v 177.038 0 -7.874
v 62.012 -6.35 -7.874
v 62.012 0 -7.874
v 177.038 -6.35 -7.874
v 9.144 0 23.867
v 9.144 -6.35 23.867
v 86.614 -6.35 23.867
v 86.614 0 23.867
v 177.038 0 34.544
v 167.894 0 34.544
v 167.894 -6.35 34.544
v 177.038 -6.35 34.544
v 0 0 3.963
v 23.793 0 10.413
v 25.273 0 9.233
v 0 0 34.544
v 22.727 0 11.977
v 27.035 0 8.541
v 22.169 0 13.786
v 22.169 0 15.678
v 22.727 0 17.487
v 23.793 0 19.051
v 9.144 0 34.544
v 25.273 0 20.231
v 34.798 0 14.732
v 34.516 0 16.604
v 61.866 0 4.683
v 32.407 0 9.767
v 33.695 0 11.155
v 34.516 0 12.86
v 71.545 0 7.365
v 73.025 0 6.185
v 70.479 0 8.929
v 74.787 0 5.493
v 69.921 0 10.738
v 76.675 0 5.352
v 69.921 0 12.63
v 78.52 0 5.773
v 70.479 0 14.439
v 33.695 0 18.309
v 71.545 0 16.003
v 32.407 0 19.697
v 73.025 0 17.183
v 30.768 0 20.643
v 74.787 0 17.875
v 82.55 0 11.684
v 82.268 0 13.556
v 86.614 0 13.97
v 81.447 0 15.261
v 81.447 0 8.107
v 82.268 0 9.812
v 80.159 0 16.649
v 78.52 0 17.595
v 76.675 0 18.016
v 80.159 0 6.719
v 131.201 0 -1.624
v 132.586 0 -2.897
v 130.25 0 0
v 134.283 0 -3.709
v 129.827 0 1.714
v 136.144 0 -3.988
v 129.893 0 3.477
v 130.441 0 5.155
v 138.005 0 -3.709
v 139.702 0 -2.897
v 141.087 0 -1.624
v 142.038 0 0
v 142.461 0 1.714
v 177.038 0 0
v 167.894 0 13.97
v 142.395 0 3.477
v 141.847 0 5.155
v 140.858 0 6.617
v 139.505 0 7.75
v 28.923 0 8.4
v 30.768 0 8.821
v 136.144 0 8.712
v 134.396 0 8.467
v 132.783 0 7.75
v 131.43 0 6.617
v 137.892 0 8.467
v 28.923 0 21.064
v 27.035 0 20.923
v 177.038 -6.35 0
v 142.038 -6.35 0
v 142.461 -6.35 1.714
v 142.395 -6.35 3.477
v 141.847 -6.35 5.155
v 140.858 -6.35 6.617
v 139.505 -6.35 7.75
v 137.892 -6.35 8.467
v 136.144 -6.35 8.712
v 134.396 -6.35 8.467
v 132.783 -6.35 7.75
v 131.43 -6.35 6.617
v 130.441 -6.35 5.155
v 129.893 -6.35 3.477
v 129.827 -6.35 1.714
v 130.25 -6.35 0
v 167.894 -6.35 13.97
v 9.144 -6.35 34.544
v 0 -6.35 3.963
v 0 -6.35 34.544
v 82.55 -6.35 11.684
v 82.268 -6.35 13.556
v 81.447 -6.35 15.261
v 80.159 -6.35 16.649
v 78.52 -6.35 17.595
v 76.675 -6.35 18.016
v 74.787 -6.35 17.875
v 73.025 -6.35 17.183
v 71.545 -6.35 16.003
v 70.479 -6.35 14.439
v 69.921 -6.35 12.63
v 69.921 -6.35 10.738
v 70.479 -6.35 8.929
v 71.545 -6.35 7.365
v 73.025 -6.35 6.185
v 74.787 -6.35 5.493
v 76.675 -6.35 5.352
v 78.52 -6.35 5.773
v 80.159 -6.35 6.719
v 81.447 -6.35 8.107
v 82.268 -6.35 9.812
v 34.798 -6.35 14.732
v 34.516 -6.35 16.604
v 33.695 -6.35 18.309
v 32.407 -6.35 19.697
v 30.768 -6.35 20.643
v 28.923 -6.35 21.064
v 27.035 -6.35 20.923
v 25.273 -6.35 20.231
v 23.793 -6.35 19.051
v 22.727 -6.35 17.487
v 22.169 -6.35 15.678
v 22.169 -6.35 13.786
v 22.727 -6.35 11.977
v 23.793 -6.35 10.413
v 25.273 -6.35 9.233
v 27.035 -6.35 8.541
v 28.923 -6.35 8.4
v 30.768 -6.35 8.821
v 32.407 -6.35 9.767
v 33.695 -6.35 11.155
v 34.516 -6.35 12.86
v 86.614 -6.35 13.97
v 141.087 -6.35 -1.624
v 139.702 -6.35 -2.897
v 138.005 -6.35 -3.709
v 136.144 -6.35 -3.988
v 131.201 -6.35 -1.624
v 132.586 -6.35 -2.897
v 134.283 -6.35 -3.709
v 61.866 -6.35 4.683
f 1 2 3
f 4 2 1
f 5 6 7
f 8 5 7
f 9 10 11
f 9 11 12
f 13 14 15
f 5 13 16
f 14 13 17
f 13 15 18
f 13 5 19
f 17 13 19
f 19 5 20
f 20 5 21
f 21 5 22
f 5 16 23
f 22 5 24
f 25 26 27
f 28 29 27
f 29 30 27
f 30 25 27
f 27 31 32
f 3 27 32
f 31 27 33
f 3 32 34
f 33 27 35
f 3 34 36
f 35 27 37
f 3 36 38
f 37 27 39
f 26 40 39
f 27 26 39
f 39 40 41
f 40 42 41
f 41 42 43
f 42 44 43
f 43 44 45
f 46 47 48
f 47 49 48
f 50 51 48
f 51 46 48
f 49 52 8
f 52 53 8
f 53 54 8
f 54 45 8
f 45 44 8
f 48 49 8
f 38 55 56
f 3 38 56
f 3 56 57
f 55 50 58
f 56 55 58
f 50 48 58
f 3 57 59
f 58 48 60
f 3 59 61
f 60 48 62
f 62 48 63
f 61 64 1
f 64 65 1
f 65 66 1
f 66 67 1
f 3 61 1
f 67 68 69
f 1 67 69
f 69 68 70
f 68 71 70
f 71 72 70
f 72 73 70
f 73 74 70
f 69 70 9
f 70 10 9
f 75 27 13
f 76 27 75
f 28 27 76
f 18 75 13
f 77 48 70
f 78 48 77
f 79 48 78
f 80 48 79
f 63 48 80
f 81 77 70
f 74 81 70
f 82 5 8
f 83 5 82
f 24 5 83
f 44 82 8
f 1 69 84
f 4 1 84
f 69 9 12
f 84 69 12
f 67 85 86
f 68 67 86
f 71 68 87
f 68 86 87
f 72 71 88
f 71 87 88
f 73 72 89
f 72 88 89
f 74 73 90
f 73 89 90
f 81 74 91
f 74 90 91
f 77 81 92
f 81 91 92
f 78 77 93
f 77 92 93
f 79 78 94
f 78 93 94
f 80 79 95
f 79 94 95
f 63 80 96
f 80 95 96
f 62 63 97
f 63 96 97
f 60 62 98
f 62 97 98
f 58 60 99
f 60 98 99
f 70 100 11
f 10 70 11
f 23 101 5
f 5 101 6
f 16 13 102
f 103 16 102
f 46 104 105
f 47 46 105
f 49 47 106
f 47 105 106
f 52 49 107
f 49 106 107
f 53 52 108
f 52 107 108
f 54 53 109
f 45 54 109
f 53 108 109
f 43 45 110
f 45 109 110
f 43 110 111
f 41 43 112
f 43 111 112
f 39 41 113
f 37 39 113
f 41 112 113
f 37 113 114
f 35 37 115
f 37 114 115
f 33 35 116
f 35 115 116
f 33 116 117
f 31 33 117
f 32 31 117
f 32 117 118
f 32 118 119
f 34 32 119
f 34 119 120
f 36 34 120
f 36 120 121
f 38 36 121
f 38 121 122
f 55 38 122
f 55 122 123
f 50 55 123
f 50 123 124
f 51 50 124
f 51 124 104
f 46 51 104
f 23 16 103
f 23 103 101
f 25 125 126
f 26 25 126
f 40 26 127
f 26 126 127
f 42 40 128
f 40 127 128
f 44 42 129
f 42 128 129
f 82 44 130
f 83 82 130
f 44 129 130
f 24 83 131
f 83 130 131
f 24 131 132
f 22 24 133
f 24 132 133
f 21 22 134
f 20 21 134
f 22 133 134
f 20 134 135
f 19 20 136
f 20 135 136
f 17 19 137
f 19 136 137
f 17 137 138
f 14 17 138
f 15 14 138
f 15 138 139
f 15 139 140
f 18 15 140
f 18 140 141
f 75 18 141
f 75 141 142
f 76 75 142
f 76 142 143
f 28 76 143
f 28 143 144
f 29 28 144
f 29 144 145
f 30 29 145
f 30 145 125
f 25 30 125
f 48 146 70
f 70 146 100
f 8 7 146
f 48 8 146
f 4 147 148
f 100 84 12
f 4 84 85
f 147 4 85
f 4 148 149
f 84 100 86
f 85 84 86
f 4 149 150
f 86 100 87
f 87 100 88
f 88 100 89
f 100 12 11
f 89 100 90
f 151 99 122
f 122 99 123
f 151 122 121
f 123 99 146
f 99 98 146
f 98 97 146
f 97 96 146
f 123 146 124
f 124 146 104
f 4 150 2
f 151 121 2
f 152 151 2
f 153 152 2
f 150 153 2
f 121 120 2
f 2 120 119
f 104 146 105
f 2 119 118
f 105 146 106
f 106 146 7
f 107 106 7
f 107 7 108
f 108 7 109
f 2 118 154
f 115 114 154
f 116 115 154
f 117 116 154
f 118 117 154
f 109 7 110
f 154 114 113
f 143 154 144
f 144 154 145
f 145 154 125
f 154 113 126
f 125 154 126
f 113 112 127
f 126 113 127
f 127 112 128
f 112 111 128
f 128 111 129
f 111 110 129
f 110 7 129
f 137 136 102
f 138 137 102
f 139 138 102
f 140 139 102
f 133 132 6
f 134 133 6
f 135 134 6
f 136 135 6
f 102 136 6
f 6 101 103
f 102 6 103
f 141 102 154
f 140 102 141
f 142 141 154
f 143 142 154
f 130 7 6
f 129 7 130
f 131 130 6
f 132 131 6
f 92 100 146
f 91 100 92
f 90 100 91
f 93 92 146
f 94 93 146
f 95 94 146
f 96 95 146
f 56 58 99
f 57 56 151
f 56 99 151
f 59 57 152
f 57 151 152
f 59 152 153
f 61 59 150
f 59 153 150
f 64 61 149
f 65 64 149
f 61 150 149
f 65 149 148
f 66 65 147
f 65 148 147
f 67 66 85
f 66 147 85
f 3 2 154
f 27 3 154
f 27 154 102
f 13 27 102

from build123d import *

# Parameters (mm, degrees)
F0_W      = 177.038
F0_H      = 34.544
F1_DEPTH  = 6.35
F2_R      = 6.35
F3_DEPTH  = 6.351
F4_DEPTH  = 25.4
F6_W      = 130.2497221681
F6_H      = 6.35
F6_W_2    = 46.7882778319
F7_DEPTH  = 7.874
F9_DEPTH  = 25.4
F11_DEPTH = 25.4


with BuildPart() as f1:
    # F0 (on Front) → F1 (new body)
    with BuildSketch(Plane.XZ):
        with Locations((88.519, 17.272)):
            Rectangle(F0_W, F0_H)
    extrude(amount=F1_DEPTH)

    # F2 (on face) → F3 (cut, through all)
    with BuildSketch(Plane.XZ.offset(6.35)):
        with Locations((28.448, 14.732)):
            Circle(F2_R)
    extrude(amount=-F3_DEPTH, mode=Mode.SUBTRACT)

    # F2 (on face) → F4 (cut)
    with BuildSketch(Plane.XZ.offset(6.35)):
        with Locations((28.448, 14.732)):
            Circle(F2_R)
        with Locations((76.2, 11.684)):
            Circle(F2_R)
        with Locations((136.144, 2.3622)):
            Circle(F2_R)
    extrude(amount=-F4_DEPTH, mode=Mode.SUBTRACT)

    # F6 (on face) → F7 (join)
    with BuildSketch(Plane(origin=(0, 0, 0), x_dir=(1, 0, 0), z_dir=(0, 0, -1))):
        with Locations((65.124861084, 3.175)):
            Rectangle(F6_W, F6_H)
        with Locations((153.643861084, 3.175)):
            Rectangle(F6_W_2, F6_H)
    extrude(amount=F7_DEPTH)

    # F8 (on face) → F9 (cut)
    with BuildSketch(Plane.XZ.offset(6.35)):
        with BuildLine():
            Line((142.0382778319, 0), (130.2497221681, 0))
            ThreePointArc((130.2497221681, 0), (136.144, -3.9878), (142.0382778319, 0))
        make_face()
    extrude(amount=-F9_DEPTH, mode=Mode.SUBTRACT)

    # F10 (on face) → F11 (cut)
    with BuildSketch(Plane.XZ.offset(6.35)):
        Polygon((167.894, 34.544), (9.144, 34.544), (9.144, 23.8669347018), (86.614, 23.8669347018), (86.614, 13.97), (167.894, 13.97), align=None)
        Polygon((61.8659904612, 4.6831931899), (0, 3.9632934857), (0, -7.874), (62.0121114495, -7.874), align=None)
    extrude(amount=-F11_DEPTH, mode=Mode.SUBTRACT)


solid = f1.part
